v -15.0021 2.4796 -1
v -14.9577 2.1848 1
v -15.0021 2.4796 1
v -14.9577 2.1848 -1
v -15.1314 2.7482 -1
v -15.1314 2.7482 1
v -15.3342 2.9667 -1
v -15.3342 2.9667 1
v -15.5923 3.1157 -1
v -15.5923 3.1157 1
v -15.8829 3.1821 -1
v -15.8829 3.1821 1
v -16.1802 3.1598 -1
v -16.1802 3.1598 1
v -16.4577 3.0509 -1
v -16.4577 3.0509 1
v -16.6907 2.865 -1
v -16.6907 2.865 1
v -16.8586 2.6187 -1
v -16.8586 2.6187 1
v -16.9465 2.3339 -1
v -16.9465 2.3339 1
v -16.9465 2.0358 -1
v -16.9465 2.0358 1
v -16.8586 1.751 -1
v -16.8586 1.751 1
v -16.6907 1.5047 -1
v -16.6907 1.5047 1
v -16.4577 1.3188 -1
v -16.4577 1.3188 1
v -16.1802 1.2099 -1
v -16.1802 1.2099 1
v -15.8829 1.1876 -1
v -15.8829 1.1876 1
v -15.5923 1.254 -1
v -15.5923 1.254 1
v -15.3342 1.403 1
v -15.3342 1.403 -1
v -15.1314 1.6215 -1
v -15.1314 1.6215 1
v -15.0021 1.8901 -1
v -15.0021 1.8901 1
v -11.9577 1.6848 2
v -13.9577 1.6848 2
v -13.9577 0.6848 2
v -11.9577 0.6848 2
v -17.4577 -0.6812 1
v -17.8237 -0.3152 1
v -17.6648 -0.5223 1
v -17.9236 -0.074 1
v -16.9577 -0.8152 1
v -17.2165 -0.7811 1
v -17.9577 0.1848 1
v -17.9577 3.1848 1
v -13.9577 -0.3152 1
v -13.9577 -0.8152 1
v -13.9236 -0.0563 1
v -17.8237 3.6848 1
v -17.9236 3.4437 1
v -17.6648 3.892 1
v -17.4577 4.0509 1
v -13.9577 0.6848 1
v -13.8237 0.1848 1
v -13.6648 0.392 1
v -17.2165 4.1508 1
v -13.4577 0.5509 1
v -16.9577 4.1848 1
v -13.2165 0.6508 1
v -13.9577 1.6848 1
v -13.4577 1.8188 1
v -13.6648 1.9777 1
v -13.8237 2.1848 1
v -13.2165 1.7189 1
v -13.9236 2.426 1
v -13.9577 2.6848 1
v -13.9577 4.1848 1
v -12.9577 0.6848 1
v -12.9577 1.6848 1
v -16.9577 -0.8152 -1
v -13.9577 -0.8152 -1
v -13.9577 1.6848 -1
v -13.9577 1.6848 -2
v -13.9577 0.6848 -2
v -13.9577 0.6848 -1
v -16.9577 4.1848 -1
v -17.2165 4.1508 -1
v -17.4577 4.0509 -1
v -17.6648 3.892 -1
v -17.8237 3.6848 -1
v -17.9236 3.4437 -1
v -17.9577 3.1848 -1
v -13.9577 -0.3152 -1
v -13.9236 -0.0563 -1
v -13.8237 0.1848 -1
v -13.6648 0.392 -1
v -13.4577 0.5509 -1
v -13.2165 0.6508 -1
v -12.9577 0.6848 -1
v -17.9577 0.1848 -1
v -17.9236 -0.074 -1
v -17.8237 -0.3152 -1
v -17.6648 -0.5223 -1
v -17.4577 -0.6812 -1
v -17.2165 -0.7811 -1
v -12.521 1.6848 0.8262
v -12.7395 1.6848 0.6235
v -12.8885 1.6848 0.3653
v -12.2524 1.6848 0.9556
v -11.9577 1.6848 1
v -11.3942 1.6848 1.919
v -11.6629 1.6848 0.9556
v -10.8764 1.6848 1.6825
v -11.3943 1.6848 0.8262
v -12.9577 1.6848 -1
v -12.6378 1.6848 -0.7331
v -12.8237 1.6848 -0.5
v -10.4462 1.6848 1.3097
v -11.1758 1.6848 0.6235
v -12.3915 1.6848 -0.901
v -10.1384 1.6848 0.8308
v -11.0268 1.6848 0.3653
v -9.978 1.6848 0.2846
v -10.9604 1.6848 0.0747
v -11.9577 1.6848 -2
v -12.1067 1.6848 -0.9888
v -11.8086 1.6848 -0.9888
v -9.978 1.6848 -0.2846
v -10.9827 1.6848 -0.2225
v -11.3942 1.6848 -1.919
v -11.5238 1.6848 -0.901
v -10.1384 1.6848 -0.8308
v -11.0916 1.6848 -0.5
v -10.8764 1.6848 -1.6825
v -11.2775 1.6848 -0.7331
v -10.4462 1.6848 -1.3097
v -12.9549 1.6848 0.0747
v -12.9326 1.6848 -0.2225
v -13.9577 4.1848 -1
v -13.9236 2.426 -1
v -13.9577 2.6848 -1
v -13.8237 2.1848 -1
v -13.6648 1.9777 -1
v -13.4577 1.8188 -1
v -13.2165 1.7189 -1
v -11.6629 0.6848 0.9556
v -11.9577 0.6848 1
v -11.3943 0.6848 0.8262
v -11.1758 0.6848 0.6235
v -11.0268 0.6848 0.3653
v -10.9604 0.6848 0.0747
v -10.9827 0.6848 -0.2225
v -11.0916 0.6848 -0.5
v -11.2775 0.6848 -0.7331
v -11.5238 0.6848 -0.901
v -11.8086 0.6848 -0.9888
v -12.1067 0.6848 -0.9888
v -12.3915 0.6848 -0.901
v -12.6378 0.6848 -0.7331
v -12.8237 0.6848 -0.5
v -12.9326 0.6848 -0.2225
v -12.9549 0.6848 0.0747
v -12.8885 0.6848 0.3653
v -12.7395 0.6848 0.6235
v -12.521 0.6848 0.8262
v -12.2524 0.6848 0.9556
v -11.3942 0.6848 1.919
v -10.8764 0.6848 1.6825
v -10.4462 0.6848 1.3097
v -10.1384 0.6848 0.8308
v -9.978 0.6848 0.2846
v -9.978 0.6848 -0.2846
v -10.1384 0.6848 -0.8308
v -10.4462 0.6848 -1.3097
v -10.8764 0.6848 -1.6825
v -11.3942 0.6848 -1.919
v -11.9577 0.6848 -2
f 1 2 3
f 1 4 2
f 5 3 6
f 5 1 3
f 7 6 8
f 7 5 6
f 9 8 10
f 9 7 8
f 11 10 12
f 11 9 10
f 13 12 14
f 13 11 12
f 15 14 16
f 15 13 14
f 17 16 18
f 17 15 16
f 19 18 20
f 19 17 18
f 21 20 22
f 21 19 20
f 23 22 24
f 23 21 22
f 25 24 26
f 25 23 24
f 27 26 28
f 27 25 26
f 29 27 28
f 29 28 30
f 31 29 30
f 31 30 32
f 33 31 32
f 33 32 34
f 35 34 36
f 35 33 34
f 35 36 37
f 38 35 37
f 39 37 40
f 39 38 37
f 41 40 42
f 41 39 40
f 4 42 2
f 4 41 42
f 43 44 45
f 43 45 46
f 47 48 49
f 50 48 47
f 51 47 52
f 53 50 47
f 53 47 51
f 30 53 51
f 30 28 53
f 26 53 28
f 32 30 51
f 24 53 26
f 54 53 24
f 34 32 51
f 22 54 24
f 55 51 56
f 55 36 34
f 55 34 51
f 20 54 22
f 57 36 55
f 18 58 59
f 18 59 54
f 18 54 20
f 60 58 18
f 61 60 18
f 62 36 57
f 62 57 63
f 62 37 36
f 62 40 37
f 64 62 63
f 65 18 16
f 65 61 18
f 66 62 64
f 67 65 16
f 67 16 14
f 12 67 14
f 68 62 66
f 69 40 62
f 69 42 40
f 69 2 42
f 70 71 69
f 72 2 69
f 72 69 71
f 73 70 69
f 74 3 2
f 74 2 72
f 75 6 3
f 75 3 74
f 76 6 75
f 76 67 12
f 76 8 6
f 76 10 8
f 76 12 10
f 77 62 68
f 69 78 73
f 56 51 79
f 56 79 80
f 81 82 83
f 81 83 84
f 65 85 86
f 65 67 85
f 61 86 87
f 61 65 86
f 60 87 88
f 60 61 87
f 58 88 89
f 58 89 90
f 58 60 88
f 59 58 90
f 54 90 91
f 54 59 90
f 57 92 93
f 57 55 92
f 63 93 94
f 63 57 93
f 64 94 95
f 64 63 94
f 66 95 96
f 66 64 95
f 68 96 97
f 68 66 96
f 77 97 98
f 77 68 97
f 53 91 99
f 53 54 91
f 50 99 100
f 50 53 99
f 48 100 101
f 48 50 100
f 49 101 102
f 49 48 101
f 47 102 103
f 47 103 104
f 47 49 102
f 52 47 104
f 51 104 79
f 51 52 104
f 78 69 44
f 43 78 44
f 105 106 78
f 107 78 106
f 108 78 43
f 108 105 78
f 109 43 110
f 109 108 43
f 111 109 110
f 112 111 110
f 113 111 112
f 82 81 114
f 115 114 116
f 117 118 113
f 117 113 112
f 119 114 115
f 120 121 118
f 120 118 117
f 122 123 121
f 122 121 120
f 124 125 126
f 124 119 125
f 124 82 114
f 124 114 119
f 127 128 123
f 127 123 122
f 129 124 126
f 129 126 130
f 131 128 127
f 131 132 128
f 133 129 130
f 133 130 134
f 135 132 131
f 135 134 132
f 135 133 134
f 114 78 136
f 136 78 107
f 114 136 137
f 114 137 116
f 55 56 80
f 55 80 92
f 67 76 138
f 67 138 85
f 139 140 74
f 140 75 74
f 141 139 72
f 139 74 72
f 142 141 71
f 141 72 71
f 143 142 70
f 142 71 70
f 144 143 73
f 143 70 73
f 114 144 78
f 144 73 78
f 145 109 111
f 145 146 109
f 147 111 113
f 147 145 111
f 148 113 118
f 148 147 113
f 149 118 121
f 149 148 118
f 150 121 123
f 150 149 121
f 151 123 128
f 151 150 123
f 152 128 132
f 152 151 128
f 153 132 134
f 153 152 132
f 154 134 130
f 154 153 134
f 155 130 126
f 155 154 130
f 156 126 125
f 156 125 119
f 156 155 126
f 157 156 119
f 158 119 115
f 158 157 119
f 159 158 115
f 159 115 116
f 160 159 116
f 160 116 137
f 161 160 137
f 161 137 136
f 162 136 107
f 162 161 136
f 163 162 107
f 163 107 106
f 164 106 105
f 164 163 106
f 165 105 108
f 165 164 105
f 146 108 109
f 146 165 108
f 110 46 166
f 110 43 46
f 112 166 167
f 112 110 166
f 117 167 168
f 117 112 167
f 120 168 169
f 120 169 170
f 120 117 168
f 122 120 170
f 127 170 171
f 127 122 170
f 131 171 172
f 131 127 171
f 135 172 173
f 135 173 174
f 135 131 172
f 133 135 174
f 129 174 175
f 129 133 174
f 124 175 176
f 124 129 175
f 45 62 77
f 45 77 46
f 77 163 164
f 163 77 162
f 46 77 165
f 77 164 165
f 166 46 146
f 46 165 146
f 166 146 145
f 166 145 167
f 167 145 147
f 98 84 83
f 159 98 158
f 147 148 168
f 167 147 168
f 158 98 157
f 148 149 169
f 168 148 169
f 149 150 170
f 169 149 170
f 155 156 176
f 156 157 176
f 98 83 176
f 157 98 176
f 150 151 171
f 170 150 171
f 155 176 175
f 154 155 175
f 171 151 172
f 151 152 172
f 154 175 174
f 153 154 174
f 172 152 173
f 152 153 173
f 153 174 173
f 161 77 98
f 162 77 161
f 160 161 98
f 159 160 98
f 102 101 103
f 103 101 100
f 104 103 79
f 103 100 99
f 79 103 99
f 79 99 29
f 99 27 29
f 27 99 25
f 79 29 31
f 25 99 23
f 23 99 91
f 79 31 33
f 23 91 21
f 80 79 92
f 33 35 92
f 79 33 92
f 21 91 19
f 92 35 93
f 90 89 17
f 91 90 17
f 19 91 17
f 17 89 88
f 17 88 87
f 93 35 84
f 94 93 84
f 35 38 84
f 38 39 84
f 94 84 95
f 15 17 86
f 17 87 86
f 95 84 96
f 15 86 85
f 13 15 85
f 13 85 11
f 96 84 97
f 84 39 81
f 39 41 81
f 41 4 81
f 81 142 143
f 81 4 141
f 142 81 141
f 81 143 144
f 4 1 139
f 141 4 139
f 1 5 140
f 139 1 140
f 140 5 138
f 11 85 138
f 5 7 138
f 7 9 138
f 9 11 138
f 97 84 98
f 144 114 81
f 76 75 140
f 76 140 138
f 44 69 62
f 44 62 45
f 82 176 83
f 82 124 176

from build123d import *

# Parameters (mm, degrees)
SKETCH_1_R      = 5
EXTRUDE_1_DEPTH = 2.5
SKETCH_2_R      = 5
EXTRUDE_2_DEPTH = 5
FILLET_1_R      = 5
SCALE_1_SCALE   = 0.2


with BuildPart() as part:
    # 草圖1 → 填料-伸長1 (new, symmetric)
    with BuildSketch(Plane(origin=(0, 0, 0), x_dir=(1, 0, 0), z_dir=(0, 1, 0))):
        with BuildLine():
            Line((0, 10), (-10, 10))
            Line((-10, 10), (-10, -10))
            Line((-10, -10), (0, -10))
            ThreePointArc((0, -10), (10, 0), (0, 10))
        make_face()
        with Locations(Location((0, 0, 0), (0, 0, 270))):
            Circle(SKETCH_1_R, mode=Mode.SUBTRACT)
    extrude(amount=EXTRUDE_1_DEPTH, both=True)

    # 草圖2 → 填料-伸長2 (add, symmetric)
    with BuildSketch(Plane.XY):
        with BuildLine():
            Line((-30, 1.898257061), (-30, -5))
            ThreePointArc((-30, -5), (-28.535533906, -8.535533906), (-25, -10))
            Line((-25, -10), (-10, -10))
            Line((-10, -10), (-10, -2.5))
            Line((-10, -2.5), (-10, 2.5))
            Line((-10, 2.5), (-10, 15))
            Line((-10, 15), (-25, 15))
            ThreePointArc((-25, 15), (-28.535533906, 13.535533906), (-30, 10))
            Line((-30, 10), (-30, 1.898257061))
        make_face()
        with Locations((-20, 5)):
            Circle(SKETCH_2_R, mode=Mode.SUBTRACT)
    extrude(amount=EXTRUDE_2_DEPTH, both=True)

    # 圓角1
    fillet_1_edges = [part.edges().sort_by_distance(p)[0] for p in [
        (-10, -2.5, 0),
        (-10, 2.5, 0),
    ]]
    fillet(fillet_1_edges, radius=FILLET_1_R)


with BuildPart() as part_1:
    # 縮放比例1: scaled about (-14.947063882, 1.481061389, 0)
    add(part.part.scale(SCALE_1_SCALE).moved(Location((-11.957651106, 1.184849111, 0))))


solid = part_1.part
